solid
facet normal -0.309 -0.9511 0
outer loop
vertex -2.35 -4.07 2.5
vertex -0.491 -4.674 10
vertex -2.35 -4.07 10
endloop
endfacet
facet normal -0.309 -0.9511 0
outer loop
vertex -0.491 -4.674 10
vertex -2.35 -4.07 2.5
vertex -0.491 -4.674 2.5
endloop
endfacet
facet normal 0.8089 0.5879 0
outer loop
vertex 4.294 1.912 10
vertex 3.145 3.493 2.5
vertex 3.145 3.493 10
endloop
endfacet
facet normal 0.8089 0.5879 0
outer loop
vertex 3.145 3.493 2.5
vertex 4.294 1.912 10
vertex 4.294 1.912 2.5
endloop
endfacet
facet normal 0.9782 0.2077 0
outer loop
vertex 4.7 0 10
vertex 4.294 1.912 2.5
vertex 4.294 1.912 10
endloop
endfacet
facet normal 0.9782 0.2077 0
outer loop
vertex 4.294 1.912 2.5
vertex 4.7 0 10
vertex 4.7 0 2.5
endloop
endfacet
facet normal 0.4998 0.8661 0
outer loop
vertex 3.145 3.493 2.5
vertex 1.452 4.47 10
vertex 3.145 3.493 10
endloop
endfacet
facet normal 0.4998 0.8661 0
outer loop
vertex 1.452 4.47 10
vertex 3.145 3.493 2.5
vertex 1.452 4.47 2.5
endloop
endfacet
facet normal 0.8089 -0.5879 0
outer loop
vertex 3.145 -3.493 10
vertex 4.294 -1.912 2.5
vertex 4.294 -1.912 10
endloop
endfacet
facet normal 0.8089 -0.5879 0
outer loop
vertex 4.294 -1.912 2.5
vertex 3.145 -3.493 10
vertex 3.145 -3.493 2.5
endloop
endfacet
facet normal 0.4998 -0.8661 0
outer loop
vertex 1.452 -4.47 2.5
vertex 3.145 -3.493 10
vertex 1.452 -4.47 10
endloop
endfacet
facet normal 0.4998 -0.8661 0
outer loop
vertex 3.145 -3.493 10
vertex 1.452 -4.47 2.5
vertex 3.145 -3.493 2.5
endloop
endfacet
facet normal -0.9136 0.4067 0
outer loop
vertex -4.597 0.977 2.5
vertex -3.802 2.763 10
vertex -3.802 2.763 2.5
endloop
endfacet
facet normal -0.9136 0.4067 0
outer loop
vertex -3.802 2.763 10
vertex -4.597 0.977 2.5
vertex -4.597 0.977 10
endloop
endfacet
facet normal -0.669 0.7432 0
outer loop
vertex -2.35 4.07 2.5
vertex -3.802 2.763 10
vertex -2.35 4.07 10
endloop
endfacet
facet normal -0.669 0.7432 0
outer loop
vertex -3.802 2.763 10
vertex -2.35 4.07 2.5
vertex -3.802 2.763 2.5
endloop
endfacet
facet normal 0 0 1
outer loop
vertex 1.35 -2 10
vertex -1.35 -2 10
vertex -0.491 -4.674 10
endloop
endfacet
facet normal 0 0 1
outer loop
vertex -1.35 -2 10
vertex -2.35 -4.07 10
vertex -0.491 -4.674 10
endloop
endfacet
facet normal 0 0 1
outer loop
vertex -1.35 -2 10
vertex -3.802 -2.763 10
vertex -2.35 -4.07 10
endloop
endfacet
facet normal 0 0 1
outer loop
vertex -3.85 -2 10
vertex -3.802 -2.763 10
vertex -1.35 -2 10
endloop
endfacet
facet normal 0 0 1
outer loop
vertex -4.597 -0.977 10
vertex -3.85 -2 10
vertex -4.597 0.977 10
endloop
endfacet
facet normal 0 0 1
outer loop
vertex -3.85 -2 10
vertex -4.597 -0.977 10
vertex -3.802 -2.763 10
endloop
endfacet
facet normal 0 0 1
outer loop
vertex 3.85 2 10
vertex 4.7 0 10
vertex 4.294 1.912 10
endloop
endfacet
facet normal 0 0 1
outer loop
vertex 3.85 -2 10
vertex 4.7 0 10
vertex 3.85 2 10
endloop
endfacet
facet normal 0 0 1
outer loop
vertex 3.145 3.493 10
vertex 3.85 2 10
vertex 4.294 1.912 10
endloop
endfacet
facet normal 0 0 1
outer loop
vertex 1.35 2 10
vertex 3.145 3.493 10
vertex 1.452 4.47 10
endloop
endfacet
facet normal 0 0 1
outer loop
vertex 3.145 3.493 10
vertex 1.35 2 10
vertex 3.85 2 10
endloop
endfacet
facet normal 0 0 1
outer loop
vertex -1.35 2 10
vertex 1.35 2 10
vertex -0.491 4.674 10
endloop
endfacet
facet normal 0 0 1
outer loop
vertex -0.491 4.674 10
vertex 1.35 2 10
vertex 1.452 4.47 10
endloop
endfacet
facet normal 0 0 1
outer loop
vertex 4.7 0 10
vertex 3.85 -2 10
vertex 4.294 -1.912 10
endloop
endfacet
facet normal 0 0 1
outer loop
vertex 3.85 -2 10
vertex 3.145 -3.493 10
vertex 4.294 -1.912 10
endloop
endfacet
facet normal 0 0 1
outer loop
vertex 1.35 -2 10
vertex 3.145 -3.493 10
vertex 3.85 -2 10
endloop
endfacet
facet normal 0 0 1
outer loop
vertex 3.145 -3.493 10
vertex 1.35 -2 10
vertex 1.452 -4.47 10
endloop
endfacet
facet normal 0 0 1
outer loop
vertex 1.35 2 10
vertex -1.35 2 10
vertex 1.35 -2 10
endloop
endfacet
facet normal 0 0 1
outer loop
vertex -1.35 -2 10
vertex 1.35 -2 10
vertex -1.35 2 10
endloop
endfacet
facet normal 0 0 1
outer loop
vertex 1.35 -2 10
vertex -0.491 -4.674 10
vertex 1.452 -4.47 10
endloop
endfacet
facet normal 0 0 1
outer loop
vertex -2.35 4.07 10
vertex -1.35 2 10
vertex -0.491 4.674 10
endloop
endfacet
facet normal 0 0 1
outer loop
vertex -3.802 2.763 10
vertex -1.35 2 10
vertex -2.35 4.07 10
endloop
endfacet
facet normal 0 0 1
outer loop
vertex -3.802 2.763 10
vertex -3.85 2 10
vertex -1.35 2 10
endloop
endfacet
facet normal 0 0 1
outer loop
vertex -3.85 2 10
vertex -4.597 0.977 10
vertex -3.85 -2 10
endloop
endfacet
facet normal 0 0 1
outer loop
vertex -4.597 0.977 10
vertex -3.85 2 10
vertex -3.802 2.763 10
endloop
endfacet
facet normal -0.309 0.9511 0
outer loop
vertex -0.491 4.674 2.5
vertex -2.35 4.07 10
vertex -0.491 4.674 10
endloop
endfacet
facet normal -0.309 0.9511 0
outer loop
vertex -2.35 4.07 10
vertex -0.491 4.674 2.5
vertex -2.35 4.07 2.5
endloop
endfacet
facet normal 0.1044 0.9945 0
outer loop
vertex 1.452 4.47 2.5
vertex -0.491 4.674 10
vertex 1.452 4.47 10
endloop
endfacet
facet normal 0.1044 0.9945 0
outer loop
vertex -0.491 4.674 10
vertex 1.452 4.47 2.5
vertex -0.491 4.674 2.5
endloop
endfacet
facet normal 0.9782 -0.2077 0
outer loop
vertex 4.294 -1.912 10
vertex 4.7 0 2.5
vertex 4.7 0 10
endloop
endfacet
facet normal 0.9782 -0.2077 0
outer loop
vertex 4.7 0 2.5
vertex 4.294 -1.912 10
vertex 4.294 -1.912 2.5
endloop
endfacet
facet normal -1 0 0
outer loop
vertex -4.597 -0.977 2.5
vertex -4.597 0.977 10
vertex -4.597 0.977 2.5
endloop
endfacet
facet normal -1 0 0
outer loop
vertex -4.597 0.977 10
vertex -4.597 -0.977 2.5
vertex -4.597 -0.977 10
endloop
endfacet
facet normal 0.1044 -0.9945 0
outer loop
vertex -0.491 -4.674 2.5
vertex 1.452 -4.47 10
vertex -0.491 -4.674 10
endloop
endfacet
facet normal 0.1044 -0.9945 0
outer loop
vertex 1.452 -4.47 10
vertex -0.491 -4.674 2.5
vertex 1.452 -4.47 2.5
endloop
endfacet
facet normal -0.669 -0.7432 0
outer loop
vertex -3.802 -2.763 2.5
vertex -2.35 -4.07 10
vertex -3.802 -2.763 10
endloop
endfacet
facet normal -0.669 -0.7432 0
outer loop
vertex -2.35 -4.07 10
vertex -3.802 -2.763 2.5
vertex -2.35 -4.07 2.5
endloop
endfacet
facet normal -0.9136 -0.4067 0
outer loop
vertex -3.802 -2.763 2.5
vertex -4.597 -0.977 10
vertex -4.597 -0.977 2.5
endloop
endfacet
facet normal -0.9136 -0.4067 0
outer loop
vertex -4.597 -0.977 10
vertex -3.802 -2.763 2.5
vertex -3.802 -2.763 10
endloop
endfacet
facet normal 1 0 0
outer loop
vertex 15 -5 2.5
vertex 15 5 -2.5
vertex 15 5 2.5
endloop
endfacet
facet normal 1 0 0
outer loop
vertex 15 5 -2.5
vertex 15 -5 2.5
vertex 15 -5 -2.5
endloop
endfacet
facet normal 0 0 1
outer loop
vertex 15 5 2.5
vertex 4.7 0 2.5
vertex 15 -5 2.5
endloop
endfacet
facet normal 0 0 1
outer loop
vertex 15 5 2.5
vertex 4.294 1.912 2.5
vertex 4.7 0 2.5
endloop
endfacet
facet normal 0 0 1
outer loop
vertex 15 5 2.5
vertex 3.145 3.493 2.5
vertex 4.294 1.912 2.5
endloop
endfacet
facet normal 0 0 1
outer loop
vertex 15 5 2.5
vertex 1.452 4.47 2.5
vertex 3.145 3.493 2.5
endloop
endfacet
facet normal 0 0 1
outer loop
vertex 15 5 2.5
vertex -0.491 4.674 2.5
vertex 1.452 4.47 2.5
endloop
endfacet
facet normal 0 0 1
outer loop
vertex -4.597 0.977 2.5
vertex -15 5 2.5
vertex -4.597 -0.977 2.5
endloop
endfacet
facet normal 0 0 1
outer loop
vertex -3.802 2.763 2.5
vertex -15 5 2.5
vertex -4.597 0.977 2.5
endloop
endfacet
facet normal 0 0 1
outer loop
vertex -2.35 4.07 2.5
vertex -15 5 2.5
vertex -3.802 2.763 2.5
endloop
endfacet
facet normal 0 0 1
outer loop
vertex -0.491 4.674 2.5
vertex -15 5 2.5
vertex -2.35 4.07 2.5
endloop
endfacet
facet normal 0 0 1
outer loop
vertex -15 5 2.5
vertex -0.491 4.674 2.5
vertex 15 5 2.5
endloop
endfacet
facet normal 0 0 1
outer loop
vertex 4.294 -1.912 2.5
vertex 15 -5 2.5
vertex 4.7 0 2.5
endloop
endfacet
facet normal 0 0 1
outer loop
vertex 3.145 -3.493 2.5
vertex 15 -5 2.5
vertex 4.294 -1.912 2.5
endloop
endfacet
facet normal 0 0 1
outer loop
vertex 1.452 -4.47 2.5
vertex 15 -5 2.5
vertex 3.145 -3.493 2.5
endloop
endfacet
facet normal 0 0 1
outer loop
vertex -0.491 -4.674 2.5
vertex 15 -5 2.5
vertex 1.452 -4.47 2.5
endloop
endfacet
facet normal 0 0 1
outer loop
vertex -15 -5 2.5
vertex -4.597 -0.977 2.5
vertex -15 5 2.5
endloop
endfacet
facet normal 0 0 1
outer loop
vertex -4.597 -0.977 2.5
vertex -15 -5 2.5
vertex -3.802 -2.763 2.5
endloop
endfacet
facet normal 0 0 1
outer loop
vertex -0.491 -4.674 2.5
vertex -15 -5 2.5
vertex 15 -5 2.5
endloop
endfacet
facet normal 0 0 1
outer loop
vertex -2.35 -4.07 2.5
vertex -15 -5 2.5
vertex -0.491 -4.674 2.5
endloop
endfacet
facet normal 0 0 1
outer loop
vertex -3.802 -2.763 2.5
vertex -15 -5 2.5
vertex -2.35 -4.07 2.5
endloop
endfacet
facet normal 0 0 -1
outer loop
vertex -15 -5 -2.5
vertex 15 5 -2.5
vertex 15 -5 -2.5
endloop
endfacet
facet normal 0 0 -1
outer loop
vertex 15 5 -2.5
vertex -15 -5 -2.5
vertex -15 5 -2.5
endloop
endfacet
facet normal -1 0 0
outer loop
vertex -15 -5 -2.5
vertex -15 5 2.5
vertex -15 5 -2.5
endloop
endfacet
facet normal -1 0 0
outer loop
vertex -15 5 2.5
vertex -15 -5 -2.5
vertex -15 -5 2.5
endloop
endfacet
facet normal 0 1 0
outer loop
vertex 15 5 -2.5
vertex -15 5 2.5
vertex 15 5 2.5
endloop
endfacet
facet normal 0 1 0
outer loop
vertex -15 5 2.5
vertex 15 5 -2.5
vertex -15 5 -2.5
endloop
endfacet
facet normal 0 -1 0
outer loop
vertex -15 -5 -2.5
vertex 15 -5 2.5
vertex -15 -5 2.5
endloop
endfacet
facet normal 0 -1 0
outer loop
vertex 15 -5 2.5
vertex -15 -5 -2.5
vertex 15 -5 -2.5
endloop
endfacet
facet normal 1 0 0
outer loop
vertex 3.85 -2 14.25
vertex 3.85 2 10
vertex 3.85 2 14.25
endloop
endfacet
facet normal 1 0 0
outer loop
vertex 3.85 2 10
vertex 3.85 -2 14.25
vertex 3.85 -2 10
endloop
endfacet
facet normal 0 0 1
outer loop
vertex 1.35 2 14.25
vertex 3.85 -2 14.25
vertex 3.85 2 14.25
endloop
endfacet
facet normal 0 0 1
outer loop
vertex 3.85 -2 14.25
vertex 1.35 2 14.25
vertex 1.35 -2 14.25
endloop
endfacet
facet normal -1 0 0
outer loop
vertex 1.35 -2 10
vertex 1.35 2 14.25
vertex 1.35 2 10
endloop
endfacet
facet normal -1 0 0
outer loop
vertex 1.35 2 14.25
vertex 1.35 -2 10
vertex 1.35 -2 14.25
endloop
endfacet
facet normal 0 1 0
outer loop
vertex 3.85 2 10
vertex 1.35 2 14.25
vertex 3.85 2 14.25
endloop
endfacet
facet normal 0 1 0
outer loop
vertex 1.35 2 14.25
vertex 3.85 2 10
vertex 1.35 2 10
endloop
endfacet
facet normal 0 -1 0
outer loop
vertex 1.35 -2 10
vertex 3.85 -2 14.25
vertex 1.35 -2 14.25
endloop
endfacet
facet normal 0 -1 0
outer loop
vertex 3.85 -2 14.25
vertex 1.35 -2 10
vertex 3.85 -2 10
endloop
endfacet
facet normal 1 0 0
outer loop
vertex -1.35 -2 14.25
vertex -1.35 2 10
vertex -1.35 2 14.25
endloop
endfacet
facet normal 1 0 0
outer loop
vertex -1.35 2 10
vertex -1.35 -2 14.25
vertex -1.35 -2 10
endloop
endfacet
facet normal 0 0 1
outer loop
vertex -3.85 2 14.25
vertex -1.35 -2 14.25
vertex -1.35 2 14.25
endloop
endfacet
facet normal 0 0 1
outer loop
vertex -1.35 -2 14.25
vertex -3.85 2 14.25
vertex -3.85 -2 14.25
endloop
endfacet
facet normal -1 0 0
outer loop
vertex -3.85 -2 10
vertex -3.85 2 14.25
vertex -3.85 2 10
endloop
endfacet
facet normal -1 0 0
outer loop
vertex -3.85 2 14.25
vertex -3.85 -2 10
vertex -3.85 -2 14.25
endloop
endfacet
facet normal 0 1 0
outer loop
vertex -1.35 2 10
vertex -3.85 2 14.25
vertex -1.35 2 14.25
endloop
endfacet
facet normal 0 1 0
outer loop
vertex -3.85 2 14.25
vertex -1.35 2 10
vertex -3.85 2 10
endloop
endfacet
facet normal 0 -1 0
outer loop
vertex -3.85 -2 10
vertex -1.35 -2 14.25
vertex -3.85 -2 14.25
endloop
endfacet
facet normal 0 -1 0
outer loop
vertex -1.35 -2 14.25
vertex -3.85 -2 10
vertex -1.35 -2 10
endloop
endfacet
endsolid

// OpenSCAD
//it opens soap and igienic paper dispensers in restrooms made by Borman
module bormanKey(){
    translate([0,0,5]){
    cylinder(h=10,r1=4.7, r2=4.7, center=true);
    translate([0,0,-5]){    
    cube([30,10,5],center=true);
    }    
    }    
    translate([2.6,0,12]){
        cube([2.5,4,4.5],center=true);
    }
    translate([-2.6,0,12]){
        cube([2.5,4,4.5],center=true);
    }
    
}
bormanKey();
